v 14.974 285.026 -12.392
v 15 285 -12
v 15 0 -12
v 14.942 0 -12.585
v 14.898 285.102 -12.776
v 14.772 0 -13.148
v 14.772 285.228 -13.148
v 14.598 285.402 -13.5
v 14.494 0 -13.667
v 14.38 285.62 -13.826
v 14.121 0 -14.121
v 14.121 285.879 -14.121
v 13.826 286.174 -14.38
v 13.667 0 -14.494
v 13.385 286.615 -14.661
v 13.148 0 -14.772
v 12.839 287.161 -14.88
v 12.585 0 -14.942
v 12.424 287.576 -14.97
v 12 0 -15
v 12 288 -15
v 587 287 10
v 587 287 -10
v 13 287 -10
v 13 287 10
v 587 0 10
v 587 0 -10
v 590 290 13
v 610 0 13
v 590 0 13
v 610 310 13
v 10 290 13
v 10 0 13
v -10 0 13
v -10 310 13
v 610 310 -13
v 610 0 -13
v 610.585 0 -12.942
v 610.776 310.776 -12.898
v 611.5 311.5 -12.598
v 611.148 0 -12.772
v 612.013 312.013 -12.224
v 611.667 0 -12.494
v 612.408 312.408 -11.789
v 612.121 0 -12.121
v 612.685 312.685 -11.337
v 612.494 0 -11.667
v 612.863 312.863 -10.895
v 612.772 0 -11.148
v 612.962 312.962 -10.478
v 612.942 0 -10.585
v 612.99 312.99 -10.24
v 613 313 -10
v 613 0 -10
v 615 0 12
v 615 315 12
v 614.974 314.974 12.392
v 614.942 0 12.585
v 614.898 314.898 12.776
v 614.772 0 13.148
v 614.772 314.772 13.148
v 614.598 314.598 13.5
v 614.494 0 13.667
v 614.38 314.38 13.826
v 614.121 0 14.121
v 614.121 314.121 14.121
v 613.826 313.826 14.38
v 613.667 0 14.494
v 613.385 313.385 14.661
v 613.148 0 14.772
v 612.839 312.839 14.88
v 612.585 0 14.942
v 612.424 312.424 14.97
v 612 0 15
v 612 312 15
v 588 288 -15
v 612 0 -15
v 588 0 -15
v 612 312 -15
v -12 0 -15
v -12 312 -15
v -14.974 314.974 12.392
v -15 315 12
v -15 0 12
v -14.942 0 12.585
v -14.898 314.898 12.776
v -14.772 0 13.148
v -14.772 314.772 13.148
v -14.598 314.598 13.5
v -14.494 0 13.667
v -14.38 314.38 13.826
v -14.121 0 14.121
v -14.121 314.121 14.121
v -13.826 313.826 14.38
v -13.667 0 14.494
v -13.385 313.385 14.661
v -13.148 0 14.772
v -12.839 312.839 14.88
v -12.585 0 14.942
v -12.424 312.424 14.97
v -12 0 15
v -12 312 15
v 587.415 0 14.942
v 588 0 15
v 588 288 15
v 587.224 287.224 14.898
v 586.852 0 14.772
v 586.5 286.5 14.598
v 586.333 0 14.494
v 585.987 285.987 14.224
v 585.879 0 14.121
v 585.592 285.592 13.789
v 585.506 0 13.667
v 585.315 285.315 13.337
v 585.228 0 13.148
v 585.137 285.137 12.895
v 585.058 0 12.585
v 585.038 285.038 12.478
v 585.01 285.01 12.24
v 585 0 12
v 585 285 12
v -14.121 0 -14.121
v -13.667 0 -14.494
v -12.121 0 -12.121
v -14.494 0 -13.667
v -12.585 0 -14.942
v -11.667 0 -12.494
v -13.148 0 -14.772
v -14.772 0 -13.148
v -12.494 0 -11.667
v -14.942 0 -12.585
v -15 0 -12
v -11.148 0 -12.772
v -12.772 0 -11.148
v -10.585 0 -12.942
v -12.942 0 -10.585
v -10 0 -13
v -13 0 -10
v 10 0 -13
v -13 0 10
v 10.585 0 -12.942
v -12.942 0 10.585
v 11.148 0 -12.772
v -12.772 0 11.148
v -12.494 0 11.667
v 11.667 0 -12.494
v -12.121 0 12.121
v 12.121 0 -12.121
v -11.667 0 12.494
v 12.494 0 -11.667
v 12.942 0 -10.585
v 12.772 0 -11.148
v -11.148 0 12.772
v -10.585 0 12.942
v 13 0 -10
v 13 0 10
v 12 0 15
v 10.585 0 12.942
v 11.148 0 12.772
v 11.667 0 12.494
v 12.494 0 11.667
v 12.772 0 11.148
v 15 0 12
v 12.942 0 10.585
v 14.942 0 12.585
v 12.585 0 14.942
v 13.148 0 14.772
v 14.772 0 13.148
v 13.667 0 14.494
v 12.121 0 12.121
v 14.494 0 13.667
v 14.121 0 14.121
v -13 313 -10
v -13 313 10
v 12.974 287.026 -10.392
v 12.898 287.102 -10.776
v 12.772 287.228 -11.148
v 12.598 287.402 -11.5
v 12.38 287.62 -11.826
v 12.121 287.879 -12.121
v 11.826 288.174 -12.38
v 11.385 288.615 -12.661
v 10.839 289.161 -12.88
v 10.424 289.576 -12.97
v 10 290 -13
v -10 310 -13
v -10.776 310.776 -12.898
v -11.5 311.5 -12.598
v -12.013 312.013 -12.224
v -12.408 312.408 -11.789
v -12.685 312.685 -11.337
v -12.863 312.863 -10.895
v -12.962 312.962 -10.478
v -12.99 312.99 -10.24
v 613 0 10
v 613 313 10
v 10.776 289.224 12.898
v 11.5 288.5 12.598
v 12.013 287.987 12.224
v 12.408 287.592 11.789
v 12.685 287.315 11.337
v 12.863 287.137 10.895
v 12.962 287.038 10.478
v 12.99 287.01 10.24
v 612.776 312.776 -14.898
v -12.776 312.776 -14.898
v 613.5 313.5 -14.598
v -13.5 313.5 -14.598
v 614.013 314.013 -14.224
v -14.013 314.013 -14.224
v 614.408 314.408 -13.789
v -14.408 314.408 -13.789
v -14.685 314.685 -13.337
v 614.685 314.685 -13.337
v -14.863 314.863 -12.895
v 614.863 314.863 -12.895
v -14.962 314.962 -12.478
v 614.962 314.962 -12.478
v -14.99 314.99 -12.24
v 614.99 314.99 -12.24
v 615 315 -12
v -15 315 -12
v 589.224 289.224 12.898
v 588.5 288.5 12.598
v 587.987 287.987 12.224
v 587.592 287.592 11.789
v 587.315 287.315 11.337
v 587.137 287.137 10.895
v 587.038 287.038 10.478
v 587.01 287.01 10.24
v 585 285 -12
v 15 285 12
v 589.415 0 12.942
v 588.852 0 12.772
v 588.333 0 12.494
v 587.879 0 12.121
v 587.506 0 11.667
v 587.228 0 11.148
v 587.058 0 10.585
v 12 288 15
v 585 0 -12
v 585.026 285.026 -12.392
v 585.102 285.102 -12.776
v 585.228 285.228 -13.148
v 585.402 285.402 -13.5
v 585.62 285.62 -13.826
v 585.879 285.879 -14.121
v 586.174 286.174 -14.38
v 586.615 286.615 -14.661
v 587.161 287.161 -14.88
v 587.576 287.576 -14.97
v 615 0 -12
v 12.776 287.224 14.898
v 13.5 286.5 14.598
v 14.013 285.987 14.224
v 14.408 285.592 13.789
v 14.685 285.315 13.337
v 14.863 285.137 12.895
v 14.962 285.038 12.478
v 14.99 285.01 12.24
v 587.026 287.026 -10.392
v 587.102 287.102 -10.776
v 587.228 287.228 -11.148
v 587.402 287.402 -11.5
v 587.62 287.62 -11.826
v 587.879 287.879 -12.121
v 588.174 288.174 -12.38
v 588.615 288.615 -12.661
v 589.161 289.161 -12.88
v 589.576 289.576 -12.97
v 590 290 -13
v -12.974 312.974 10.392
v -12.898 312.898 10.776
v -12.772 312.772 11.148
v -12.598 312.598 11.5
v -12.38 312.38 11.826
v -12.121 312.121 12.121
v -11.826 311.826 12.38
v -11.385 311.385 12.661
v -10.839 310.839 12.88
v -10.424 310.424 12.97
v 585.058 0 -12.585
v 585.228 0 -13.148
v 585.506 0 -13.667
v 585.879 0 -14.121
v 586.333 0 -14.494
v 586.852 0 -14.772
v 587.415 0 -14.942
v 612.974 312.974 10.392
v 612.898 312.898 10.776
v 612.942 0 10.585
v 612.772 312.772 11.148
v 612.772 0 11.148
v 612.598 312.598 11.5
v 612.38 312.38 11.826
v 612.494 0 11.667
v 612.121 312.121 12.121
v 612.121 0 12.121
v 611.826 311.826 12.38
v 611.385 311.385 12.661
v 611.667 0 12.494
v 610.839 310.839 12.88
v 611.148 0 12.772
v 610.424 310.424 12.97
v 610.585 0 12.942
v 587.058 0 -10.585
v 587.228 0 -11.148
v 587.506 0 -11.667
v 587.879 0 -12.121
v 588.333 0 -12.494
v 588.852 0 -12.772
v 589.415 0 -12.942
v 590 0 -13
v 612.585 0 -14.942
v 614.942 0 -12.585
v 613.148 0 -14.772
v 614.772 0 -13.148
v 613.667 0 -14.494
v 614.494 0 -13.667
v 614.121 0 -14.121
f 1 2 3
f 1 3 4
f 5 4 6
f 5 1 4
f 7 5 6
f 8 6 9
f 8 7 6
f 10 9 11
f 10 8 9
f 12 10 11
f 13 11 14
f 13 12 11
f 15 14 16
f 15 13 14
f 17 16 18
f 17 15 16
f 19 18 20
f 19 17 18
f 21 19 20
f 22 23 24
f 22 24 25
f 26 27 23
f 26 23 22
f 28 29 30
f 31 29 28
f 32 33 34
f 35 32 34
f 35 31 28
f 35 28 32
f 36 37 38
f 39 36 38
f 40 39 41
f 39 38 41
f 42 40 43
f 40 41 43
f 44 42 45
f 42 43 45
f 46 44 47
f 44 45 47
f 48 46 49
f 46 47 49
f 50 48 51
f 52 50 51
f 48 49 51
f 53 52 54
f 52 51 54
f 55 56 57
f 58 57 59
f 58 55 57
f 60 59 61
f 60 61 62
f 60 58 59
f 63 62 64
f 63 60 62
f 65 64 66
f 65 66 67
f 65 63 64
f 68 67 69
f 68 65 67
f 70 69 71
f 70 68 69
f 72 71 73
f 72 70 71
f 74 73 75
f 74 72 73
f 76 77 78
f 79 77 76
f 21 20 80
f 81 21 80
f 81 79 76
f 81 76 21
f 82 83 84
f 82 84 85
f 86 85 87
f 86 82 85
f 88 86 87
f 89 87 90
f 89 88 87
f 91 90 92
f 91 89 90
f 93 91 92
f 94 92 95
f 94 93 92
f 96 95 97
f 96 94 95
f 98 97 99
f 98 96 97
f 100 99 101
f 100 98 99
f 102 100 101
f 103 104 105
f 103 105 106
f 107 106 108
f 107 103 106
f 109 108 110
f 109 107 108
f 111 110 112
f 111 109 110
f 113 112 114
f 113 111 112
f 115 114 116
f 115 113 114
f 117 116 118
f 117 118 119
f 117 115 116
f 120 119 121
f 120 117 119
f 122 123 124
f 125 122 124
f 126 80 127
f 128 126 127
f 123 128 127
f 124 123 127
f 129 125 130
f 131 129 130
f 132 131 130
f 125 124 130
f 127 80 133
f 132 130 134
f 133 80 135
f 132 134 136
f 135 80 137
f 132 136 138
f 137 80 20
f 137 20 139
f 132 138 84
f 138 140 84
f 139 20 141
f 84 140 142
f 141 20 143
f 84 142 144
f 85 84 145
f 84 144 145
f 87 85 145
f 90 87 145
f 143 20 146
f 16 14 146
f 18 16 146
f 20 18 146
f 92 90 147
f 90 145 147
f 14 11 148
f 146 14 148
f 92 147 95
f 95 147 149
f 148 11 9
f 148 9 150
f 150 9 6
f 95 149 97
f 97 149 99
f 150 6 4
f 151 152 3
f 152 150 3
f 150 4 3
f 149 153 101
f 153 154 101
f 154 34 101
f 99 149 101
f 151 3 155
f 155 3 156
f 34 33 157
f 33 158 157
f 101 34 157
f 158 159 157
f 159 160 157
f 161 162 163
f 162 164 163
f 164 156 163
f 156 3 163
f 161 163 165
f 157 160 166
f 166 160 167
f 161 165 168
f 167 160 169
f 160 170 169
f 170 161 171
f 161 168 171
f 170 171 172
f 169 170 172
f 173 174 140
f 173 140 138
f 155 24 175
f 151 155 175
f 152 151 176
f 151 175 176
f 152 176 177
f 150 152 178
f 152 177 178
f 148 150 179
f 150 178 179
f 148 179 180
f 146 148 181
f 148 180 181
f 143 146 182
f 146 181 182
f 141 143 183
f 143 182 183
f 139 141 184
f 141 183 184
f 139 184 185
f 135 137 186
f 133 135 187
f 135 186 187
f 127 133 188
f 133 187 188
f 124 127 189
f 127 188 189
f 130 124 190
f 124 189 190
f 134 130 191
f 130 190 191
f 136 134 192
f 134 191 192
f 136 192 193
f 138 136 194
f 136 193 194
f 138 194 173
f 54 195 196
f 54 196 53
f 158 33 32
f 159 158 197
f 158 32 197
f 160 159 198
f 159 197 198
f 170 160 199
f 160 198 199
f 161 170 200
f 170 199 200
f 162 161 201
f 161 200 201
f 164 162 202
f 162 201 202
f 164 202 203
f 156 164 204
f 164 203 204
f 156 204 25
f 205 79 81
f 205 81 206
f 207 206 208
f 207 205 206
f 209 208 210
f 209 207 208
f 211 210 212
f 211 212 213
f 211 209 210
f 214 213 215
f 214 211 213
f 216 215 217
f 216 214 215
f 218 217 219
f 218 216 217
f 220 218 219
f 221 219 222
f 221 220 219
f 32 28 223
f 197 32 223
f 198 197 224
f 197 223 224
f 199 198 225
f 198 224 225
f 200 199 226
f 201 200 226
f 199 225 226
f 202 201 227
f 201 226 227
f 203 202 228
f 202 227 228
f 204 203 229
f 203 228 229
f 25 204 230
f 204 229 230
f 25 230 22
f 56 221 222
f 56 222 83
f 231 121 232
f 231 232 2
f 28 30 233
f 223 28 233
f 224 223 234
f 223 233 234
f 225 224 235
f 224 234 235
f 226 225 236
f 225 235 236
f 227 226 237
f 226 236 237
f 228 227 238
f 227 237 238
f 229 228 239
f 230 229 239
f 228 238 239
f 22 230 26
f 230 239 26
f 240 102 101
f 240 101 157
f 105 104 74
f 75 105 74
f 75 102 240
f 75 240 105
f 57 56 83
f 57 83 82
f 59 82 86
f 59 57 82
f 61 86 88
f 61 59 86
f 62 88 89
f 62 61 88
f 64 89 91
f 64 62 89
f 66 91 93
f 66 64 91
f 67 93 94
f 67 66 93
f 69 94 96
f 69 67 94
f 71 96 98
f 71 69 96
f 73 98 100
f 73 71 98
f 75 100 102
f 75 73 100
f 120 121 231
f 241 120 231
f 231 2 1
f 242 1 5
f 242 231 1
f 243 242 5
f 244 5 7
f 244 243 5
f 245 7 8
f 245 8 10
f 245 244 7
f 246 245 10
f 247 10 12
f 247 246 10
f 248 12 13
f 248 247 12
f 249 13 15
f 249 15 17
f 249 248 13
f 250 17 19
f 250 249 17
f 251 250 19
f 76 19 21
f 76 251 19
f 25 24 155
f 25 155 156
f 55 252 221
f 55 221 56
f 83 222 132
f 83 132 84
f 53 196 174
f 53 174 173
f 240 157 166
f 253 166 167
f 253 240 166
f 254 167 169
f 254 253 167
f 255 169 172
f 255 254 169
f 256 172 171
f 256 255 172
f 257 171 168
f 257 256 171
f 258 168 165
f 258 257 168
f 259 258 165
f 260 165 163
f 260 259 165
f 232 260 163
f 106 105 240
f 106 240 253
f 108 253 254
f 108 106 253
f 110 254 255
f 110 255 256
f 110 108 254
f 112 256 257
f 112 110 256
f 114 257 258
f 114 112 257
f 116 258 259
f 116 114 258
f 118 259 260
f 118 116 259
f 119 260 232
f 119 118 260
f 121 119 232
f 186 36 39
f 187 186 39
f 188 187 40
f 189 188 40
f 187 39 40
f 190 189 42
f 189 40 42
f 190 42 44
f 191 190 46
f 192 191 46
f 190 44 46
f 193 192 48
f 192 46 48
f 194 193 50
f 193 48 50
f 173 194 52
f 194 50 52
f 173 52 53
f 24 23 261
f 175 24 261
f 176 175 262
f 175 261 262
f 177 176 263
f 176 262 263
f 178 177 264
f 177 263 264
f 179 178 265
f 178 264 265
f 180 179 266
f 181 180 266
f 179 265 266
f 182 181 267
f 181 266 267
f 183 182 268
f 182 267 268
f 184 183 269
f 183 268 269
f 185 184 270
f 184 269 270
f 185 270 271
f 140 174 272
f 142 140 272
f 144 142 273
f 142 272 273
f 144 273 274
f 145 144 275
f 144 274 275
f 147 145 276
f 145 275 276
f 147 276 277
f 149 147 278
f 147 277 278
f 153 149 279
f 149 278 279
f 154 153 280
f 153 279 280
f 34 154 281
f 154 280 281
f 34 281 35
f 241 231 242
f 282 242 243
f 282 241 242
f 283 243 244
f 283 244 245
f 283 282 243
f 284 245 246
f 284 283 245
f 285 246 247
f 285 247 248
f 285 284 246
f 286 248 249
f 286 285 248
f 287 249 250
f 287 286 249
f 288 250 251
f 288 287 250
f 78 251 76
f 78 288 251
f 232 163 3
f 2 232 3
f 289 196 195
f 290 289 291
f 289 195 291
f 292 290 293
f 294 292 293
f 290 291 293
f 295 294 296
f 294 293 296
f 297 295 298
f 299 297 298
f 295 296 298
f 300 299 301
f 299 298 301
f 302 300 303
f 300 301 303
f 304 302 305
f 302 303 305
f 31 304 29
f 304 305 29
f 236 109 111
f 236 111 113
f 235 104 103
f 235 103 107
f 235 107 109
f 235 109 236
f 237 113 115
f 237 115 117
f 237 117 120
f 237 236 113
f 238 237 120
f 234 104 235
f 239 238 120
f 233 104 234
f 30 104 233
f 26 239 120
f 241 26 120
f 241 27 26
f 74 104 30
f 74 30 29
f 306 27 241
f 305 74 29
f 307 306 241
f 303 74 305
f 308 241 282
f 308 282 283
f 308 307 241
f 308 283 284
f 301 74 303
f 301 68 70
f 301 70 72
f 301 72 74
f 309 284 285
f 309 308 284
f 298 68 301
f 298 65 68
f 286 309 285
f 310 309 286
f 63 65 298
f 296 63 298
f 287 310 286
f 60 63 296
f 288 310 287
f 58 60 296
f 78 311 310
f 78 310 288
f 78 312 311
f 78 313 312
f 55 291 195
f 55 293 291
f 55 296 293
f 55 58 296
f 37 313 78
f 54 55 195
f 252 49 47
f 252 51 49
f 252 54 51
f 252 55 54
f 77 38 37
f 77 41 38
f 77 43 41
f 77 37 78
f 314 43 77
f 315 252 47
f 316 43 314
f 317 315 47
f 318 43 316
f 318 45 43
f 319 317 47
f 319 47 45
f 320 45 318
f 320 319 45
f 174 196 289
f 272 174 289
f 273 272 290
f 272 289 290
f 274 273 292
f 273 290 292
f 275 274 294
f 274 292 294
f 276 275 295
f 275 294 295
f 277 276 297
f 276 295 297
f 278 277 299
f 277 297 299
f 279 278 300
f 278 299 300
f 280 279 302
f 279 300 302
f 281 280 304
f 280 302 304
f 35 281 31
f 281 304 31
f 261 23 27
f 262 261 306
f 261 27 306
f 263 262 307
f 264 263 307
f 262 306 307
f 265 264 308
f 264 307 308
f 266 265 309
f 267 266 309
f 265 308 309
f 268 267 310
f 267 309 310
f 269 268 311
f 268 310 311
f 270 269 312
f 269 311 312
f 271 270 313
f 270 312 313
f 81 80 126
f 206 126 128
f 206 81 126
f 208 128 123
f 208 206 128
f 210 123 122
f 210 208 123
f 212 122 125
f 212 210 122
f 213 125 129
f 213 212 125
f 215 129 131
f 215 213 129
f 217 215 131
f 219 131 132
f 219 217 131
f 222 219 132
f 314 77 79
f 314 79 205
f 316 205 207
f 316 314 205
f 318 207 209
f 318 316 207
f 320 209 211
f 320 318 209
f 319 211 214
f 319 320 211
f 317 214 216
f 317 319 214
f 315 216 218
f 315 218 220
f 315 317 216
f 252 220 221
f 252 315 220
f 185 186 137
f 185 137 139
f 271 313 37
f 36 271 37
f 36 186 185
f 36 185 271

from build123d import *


with BuildPart() as part:
    # Balayage1: sweep along a path in Esquisse1
    with BuildLine(Plane.XY) as balayage1_path:
        Line((0, 0), (0, 300))
        Line((0, 300), (600, 300))
        Line((600, 300), (600, 0))
    # Esquisse2 → Balayage1 (sweep)
    with BuildSketch(Plane(origin=(0, 0, 0), x_dir=(1, 0, 0), z_dir=(0, 1, 0))):
        with BuildLine():
            Line((-12, -15), (12, -15))
            ThreePointArc((12, -15), (14.121320344, -14.121320344), (15, -12))
            Line((15, -12), (15, 12))
            ThreePointArc((15, 12), (14.121320344, 14.121320344), (12, 15))
            Line((12, 15), (-12, 15))
            ThreePointArc((-12, 15), (-14.121320344, 14.121320344), (-15, 12))
            Line((-15, 12), (-15, -12))
            ThreePointArc((-15, -12), (-14.121320344, -14.121320344), (-12, -15))
        make_face()
        with BuildLine():
            Line((-10, -13), (10, -13))
            ThreePointArc((10, -13), (12.121320344, -12.121320344), (13, -10))
            Line((13, -10), (13, 10))
            ThreePointArc((13, 10), (12.121320344, 12.121320344), (10, 13))
            Line((10, 13), (-10, 13))
            ThreePointArc((-10, 13), (-12.121320344, 12.121320344), (-13, 10))
            Line((-13, 10), (-13, -10))
            ThreePointArc((-13, -10), (-12.121320344, -12.121320344), (-10, -13))
        make_face(mode=Mode.SUBTRACT)
    sweep(path=balayage1_path.line, transition=Transition.RIGHT)


solid = part.part
